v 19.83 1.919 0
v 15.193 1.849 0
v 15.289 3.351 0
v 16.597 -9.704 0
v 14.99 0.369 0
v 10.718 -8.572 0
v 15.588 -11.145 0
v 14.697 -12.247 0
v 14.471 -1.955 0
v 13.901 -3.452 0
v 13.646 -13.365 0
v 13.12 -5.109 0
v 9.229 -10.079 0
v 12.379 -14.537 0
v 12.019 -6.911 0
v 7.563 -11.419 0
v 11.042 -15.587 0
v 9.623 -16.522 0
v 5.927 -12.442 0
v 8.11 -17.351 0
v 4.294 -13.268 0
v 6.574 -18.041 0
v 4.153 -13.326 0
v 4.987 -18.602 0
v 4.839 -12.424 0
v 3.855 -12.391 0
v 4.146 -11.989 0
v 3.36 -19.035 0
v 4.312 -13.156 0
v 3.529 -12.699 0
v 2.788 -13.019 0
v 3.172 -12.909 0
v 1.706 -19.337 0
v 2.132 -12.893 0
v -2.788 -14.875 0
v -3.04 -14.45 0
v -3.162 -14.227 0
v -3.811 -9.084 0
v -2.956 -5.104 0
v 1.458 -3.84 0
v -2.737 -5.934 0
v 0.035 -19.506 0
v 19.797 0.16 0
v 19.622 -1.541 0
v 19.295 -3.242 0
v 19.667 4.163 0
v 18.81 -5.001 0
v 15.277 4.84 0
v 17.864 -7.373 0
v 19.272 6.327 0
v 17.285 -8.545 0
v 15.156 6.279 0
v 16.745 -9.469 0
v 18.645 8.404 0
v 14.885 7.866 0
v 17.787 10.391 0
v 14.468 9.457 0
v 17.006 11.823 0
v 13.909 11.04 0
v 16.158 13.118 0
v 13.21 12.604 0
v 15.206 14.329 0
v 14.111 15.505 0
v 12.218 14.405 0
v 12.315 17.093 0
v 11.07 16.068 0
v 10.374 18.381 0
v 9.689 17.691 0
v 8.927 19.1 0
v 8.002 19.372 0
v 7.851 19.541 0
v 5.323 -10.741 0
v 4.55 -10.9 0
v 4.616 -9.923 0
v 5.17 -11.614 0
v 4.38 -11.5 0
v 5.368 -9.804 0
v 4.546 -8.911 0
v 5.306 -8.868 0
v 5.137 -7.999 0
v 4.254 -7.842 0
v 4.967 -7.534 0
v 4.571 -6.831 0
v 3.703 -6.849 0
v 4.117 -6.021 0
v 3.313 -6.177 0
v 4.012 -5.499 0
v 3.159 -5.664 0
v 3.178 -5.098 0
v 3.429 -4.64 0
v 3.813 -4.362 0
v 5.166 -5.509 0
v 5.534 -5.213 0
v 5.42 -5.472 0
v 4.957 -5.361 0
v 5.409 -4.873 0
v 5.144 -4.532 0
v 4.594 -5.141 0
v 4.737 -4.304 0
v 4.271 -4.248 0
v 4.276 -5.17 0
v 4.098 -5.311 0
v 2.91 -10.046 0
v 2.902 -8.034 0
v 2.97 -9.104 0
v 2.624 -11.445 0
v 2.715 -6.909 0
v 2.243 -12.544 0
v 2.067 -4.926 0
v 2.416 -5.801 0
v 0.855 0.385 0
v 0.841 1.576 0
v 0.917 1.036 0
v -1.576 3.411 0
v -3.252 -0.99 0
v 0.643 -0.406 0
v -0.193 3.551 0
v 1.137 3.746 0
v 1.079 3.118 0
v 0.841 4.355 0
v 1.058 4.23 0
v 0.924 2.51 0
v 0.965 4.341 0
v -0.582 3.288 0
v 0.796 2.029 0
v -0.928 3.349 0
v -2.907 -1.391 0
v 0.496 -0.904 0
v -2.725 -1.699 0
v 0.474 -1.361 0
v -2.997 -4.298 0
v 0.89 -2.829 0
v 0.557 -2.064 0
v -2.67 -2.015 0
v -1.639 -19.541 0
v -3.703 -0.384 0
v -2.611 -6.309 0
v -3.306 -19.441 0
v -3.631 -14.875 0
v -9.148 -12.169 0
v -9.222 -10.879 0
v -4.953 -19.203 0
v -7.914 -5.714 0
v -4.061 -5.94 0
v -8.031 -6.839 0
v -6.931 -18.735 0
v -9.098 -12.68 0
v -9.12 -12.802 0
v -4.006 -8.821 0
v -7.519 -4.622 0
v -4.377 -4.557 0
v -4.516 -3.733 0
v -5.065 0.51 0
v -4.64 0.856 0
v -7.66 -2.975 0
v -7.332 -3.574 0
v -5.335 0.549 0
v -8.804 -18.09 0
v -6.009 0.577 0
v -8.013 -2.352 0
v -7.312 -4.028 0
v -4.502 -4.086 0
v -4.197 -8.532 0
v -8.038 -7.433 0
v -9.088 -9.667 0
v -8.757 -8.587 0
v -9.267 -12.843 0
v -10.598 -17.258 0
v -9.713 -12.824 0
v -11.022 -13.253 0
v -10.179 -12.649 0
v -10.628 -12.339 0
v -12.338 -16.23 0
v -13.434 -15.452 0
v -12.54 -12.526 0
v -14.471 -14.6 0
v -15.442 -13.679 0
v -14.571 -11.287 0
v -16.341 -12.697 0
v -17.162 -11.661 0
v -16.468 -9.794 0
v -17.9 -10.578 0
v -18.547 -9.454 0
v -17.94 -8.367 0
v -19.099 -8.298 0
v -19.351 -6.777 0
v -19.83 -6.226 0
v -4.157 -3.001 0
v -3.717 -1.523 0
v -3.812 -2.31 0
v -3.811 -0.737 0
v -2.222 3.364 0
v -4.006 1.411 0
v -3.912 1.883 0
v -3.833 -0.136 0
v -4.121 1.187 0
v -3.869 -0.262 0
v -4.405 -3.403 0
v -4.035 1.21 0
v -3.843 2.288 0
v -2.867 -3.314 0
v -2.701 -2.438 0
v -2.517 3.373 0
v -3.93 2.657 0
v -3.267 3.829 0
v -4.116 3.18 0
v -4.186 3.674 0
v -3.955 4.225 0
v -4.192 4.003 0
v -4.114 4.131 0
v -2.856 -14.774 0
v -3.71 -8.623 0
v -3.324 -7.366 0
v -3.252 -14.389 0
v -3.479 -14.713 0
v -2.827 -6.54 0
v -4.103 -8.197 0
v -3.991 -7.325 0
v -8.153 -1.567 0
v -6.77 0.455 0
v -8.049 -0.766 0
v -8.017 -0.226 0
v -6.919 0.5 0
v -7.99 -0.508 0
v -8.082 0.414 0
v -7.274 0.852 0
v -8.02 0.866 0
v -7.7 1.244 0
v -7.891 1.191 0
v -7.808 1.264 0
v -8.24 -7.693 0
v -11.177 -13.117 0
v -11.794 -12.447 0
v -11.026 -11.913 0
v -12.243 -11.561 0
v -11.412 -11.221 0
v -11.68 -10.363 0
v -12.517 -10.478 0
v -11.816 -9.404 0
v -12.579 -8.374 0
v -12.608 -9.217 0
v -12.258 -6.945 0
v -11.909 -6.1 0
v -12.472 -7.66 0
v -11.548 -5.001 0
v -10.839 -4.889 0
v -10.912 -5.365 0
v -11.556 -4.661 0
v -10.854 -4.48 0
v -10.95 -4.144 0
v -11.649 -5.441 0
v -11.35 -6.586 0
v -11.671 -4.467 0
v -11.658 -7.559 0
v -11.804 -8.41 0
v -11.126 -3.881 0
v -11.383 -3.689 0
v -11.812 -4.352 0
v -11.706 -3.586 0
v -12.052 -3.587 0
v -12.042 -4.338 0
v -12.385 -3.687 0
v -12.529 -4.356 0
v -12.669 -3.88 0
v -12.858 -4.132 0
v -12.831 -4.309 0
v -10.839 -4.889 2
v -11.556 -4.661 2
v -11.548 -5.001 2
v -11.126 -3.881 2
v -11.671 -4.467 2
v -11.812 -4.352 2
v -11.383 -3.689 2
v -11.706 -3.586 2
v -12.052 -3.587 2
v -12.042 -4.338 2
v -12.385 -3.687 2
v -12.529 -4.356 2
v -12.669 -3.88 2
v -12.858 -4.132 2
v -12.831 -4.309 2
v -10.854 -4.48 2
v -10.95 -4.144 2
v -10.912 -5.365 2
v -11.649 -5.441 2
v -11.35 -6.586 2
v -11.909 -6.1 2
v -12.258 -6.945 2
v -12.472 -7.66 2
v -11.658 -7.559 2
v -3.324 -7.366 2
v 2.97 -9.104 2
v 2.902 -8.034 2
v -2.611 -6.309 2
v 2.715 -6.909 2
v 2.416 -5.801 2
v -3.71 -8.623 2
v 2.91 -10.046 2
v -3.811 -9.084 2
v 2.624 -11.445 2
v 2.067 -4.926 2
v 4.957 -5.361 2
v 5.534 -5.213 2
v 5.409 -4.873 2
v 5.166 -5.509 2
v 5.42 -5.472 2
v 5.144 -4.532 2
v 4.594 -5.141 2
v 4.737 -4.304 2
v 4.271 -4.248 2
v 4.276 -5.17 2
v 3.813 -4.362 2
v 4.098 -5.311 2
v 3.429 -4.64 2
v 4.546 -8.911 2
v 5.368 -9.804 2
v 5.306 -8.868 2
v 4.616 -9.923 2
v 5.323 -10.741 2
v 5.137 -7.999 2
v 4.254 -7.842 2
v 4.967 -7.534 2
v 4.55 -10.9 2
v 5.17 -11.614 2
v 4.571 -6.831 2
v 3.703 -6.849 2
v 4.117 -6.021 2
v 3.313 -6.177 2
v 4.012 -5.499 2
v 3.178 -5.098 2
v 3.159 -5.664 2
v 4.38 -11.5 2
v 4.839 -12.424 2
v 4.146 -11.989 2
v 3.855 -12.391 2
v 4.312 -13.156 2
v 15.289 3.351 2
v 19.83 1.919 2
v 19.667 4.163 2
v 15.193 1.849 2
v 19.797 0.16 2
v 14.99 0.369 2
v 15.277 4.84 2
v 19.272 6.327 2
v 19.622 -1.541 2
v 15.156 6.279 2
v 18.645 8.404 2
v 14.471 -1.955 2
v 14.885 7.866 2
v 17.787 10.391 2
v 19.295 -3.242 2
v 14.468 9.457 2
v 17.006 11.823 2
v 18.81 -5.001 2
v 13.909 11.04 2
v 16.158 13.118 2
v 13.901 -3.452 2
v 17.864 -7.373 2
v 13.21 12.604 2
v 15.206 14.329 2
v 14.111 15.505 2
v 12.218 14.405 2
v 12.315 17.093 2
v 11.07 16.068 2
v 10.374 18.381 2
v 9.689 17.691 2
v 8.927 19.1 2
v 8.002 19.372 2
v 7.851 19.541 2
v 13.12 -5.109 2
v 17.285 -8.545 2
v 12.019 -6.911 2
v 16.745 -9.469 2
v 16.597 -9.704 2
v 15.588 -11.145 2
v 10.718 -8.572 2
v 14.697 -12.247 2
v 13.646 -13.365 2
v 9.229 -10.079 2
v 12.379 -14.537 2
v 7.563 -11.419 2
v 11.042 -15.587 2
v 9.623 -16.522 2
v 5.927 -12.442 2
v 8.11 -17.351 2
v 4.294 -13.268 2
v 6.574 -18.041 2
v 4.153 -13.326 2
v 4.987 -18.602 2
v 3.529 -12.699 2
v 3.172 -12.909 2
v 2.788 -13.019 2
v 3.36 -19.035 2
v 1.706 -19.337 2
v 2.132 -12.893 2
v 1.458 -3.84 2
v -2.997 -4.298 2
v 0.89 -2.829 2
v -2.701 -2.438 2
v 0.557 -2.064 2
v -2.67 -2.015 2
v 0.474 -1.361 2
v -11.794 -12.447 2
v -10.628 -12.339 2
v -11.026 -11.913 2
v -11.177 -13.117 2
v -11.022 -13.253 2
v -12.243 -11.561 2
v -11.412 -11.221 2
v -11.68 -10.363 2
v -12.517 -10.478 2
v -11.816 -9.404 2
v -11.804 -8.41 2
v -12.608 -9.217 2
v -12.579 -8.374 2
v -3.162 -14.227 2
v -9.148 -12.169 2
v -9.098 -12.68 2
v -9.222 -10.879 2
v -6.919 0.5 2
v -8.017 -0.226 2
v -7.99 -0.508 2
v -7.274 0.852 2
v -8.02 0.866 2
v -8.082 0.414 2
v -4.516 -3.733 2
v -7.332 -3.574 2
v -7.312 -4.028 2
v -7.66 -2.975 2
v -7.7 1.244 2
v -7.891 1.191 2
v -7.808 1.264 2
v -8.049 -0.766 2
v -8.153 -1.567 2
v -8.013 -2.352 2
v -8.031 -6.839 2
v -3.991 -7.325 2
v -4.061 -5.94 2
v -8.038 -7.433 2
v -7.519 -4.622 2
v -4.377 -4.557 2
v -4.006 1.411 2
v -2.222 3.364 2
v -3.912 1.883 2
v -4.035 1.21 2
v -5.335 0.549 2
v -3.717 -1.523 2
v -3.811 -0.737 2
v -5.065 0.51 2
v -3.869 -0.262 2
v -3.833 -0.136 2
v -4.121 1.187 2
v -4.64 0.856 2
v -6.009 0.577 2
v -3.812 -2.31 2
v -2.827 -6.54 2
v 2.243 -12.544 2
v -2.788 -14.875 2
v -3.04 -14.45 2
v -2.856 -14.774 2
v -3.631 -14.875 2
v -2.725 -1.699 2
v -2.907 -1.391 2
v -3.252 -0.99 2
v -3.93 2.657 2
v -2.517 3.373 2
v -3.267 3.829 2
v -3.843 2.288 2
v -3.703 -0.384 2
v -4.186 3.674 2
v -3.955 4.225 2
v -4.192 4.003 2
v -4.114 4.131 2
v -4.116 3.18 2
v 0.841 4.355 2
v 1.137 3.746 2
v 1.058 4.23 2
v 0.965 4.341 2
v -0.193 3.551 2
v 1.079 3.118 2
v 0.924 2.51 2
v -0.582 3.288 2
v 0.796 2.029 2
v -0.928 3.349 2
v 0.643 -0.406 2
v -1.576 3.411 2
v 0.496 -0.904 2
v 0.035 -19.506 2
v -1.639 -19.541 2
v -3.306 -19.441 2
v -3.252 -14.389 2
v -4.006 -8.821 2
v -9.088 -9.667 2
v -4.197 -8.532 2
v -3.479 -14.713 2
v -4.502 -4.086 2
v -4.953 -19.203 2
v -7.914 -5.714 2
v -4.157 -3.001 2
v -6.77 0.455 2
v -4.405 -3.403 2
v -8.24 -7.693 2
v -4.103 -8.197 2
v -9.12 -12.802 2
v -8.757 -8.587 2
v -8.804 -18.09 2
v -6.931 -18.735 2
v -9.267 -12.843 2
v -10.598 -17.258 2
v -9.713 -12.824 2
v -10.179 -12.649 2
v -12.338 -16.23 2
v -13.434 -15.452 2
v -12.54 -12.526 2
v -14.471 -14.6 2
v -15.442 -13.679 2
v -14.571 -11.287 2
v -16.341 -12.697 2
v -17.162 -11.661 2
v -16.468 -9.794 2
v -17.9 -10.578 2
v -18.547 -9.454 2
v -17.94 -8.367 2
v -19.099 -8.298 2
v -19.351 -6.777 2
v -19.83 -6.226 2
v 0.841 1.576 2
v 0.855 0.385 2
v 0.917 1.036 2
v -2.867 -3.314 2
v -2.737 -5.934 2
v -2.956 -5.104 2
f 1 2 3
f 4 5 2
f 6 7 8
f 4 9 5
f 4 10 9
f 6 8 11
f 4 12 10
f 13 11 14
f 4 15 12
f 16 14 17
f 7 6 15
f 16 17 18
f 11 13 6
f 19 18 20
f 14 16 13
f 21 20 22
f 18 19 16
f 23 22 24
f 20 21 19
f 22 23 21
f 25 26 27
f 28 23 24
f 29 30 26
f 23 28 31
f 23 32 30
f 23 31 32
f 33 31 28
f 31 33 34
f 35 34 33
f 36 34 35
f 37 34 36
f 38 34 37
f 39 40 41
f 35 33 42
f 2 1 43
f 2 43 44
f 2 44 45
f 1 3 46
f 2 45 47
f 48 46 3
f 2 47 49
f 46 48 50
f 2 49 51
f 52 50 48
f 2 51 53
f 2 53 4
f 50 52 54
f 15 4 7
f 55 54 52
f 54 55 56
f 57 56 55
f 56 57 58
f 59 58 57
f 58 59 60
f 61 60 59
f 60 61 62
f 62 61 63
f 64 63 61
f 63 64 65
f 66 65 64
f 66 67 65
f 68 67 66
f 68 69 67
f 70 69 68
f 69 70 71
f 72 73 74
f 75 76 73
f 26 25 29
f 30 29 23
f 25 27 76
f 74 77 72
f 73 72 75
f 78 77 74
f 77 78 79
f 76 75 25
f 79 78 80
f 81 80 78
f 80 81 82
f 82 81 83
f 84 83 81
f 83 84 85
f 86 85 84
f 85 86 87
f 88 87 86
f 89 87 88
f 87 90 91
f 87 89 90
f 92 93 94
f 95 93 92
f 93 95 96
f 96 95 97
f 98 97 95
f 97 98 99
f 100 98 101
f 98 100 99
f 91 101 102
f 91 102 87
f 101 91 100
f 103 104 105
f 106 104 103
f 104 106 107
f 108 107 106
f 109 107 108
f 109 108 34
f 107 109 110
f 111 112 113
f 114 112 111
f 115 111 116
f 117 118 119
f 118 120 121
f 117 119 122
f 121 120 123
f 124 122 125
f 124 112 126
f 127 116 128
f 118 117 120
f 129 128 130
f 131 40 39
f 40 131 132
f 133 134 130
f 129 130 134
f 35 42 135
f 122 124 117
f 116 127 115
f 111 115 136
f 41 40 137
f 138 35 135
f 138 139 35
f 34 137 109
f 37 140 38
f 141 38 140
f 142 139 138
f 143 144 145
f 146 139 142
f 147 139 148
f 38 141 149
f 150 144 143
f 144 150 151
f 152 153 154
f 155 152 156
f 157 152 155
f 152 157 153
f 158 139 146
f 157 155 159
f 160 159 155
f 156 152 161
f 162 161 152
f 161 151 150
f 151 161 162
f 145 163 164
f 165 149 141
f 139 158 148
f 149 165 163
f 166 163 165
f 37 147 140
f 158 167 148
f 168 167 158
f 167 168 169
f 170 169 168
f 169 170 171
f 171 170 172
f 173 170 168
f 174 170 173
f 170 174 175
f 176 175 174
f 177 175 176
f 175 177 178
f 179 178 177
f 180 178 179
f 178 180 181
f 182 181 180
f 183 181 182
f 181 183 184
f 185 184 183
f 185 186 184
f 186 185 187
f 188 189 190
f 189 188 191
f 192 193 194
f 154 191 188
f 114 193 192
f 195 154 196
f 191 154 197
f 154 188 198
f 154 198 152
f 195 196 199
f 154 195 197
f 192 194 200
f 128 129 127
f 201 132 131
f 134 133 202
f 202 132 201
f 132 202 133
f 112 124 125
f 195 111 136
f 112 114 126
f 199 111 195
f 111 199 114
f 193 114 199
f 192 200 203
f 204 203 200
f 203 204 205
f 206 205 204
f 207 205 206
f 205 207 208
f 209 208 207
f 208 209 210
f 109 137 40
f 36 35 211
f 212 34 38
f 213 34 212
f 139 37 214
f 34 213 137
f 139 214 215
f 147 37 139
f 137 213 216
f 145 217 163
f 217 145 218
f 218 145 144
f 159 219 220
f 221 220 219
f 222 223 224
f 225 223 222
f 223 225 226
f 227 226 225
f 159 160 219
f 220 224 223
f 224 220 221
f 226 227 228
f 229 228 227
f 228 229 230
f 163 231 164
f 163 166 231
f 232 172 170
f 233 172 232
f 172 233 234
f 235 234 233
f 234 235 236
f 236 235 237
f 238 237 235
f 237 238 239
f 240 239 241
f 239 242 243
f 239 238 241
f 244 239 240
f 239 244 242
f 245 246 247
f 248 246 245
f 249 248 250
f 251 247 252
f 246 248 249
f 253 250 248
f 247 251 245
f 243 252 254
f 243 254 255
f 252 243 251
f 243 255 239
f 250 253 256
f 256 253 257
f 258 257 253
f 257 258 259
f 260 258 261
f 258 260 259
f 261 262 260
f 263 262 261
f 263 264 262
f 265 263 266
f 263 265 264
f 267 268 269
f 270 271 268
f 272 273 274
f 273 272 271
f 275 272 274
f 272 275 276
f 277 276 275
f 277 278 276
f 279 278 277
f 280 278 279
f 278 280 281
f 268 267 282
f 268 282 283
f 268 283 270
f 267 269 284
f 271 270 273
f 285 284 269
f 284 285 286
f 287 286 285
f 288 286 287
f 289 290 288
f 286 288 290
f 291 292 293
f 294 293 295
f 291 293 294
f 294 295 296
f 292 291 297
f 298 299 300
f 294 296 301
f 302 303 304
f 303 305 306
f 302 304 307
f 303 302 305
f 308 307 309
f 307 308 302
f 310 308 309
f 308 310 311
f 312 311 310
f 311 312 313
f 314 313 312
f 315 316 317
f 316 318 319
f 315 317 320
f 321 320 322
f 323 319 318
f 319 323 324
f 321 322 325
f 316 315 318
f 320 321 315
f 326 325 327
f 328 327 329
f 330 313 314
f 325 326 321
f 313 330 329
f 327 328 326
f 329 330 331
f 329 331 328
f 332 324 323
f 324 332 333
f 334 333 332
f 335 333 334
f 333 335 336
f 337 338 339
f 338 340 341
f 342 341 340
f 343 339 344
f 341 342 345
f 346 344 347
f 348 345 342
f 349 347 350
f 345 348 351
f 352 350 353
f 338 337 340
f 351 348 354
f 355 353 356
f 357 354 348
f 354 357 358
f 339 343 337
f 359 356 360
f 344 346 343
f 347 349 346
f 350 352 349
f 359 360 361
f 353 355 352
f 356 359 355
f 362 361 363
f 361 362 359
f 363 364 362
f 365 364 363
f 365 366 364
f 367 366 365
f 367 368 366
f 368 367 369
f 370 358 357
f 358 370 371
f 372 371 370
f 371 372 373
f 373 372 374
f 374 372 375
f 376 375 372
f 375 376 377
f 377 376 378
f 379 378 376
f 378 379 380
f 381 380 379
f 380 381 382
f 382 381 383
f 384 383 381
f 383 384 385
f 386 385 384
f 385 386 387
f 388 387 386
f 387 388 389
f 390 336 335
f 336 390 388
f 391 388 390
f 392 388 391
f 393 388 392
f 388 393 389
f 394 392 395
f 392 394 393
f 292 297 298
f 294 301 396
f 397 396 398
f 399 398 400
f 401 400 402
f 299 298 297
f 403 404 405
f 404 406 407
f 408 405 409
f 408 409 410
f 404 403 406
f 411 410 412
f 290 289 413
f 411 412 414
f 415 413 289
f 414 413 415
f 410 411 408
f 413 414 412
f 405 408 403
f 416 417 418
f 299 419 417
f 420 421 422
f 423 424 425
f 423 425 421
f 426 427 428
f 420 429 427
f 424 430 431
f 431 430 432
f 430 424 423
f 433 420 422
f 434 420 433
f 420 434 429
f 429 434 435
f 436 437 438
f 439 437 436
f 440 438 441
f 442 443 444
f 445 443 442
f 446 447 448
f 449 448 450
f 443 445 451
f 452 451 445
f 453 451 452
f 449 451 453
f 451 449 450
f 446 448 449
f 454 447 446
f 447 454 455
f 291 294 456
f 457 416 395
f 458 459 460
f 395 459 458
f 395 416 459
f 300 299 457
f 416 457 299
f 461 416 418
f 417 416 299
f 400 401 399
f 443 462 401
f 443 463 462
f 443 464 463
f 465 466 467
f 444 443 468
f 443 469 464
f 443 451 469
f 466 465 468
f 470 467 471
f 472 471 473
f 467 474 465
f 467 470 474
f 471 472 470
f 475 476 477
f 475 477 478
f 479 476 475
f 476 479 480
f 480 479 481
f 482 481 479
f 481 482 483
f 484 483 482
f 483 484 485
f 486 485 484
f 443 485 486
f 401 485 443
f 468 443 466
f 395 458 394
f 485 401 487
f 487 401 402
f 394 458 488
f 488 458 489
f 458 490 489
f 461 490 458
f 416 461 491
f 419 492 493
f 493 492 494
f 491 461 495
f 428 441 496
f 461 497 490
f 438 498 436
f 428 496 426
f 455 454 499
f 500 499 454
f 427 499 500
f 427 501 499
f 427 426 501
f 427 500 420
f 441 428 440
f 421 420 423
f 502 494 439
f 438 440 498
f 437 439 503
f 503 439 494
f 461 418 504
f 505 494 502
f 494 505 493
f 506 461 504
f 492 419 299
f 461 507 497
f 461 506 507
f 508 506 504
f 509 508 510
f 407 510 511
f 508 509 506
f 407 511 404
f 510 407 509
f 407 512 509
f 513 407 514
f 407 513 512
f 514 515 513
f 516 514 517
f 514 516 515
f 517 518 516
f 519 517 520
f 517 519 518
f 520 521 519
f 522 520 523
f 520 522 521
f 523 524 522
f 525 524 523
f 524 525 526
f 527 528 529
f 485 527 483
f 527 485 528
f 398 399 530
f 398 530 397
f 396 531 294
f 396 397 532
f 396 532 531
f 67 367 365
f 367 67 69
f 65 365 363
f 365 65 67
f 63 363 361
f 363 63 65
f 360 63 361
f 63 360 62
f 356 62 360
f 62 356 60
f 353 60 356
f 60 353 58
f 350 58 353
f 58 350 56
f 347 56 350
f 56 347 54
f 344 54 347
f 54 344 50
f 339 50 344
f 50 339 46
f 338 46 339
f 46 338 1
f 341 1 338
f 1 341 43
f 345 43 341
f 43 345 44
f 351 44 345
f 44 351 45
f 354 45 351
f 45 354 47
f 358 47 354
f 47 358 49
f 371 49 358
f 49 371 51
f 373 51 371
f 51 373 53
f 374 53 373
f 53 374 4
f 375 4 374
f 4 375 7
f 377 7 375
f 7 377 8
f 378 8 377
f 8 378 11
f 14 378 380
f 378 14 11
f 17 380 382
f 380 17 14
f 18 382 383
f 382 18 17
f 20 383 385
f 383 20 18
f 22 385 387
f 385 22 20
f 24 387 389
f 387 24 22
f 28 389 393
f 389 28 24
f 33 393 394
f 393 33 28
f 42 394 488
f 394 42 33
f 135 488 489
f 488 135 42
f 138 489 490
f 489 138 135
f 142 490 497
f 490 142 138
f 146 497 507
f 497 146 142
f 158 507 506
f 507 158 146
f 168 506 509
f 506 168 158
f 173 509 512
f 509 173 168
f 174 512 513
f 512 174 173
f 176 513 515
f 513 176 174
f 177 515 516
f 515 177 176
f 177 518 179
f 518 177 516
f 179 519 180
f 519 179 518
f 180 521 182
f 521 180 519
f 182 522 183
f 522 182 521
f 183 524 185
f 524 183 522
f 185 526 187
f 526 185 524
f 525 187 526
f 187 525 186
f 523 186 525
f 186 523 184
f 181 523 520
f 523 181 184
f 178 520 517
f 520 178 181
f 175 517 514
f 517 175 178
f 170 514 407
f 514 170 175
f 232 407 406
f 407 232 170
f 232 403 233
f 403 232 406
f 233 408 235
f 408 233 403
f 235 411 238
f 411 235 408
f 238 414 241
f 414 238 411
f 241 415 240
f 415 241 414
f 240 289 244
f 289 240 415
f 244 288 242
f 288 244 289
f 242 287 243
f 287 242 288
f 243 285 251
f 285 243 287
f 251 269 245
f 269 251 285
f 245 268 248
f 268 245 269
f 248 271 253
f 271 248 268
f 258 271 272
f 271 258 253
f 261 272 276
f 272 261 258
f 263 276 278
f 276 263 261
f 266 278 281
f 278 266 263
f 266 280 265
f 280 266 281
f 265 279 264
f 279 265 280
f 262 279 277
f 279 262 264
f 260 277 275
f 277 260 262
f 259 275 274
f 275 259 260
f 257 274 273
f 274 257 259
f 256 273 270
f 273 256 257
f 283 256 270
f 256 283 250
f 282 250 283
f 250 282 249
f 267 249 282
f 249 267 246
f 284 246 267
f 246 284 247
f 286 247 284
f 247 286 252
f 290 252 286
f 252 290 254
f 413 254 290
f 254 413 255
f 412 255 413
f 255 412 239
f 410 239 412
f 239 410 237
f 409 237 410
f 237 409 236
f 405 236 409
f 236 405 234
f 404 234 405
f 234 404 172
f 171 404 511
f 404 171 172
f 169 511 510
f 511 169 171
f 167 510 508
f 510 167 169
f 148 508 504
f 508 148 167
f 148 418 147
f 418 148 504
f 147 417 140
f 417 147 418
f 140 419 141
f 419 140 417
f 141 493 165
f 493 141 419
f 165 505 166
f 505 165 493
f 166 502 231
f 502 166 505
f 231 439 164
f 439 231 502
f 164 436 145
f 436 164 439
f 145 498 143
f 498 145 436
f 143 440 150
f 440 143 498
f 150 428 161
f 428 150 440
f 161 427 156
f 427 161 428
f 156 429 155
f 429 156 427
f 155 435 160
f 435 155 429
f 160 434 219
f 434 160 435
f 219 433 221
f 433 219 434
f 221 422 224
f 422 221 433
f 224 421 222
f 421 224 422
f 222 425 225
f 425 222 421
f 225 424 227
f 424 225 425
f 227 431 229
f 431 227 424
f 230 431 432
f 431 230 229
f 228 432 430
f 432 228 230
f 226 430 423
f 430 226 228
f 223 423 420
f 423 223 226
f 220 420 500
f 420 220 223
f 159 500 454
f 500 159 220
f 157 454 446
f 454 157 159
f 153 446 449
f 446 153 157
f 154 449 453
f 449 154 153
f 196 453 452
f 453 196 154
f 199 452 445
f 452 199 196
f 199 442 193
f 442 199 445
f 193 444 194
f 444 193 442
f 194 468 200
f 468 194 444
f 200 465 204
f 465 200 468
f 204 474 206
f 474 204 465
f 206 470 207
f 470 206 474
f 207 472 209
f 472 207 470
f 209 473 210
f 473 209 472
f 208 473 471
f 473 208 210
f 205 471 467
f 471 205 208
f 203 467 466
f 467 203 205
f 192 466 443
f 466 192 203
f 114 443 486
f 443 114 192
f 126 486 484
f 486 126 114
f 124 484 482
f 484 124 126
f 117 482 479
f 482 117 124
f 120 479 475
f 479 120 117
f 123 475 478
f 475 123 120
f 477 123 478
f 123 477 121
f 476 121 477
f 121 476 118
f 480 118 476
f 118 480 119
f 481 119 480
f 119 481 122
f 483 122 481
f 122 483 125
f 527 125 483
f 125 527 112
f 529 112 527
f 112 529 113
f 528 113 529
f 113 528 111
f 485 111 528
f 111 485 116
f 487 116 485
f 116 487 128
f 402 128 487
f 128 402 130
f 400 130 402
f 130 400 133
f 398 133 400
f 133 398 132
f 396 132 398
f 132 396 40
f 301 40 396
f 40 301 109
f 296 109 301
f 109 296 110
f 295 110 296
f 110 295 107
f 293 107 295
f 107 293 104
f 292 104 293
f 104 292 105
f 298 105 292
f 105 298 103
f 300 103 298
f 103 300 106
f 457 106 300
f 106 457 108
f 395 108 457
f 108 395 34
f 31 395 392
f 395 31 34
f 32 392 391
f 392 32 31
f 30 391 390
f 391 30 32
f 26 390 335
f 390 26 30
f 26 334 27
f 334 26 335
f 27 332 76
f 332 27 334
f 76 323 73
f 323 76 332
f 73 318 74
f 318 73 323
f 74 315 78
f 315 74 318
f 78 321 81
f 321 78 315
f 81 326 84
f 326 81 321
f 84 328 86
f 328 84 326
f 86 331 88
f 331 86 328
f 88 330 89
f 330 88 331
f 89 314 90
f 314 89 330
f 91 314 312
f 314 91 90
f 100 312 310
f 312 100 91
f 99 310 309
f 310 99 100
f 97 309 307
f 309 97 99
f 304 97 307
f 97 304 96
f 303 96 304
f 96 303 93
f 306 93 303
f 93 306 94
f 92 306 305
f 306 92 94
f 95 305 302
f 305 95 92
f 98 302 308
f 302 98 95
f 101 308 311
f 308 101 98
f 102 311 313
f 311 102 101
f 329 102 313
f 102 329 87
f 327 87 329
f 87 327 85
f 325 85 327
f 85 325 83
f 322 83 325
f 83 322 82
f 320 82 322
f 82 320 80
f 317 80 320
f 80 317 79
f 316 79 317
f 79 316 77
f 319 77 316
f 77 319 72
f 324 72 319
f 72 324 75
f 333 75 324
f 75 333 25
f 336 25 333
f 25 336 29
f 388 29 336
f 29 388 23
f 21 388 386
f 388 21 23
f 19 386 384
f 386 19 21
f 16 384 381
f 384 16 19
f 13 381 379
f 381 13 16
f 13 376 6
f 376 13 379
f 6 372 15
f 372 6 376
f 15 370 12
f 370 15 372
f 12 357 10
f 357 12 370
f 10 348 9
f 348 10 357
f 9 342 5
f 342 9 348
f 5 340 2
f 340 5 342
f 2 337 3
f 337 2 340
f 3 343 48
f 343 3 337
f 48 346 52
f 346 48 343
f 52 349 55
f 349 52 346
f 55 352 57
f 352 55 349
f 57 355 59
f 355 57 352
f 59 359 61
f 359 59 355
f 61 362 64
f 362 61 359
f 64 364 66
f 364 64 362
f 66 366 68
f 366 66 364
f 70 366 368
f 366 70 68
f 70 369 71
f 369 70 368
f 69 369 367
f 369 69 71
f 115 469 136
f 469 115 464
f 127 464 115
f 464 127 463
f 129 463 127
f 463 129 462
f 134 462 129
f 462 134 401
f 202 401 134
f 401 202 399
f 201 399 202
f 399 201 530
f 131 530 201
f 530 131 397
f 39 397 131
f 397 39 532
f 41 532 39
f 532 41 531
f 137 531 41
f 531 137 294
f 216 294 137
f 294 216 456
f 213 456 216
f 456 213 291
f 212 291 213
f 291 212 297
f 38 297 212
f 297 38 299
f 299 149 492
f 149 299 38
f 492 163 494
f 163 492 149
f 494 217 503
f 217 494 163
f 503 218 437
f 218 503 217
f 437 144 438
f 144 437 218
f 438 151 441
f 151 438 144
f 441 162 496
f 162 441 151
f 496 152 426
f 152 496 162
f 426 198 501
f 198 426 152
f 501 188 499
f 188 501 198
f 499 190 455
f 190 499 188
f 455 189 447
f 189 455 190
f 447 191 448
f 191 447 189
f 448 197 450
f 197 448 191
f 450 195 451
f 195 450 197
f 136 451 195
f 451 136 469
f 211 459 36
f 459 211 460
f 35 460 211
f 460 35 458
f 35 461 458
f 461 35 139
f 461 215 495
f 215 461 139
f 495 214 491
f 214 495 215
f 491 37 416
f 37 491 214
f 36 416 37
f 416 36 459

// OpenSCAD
// Module names are of the form poly_<inkscape-path-id>().  As a result,
// you can associate a polygon in this OpenSCAD program with the corresponding
// SVG element in the Inkscape document by looking for the XML element with
// the attribute id="inkscape-path-id".

// fudge value is used to ensure that subtracted solids are a tad taller
// in the z dimension than the polygon being subtracted from.  This helps
// keep the resulting .stl file manifold.
fudge = 0.1;

module poly_path8(h)
{
  scale([25.4/90, -25.4/90, 1]) union()
  {
    difference()
    {
       linear_extrude(height=h)
         polygon([[28.354653,-68.640997],[34.331771,-62.683431],[39.223085,-56.932971],[43.293160,-51.041248],[46.806566,-44.659895],[49.282849,-39.116539],[51.264714,-33.507341],[52.741386,-27.871806],[53.702090,-22.249440],[54.131065,-17.149226],[54.174561,-11.874229],[53.834973,-6.551347],[53.114694,-1.307476],[51.275887,6.928845],[49.255115,12.232972],[46.487328,18.102149],[42.586449,24.486894],[37.978059,30.373629],[32.701666,35.714468],[26.796775,40.461526],[21.001022,44.086465],[15.214847,47.012274],[14.716837,47.216586],[15.278695,46.616420],[17.147829,44.022617],[18.317833,41.151078],[18.861933,38.058068],[19.021752,34.737602],[18.800879,31.421924],[18.202908,28.343280],[17.597953,26.696016],[16.198098,24.205965],[14.589142,21.332830],[14.214039,19.486042],[14.519110,18.817041],[15.151000,18.319230],[16.276311,18.217074],[17.564433,18.996013],[18.305064,19.519562],[19.205313,19.388675],[19.607552,18.472464],[19.167004,17.265747],[18.228447,16.059030],[16.783100,15.249764],[15.131846,15.053433],[13.509322,15.455672],[12.150170,16.442115],[11.259498,18.063840],[11.192458,20.068650],[11.739950,21.886706],[13.120651,24.269812],[15.074383,27.787807],[16.108712,31.573961],[16.354524,35.160591],[16.121481,38.622719],[15.521315,40.747243],[14.691298,42.479105],[13.658965,43.904499],[12.504523,44.994695],[11.239945,45.740114],[9.877201,46.131179],[7.553153,45.684247],[7.949008,44.445607],[9.297785,40.552508],[10.311363,35.596350],[10.524654,32.258326],[10.284228,28.467782],[9.620015,24.480908],[8.561943,20.553891],[7.323303,17.454097],[5.165259,13.607288],[3.152468,10.023850],[1.972886,7.311930],[1.679188,4.821879],[1.758997,3.201750],[2.279354,1.437964],[3.027965,-1.364939],[3.249835,-3.669832],[2.981676,-5.585255],[2.822057,-7.191019],[3.275374,-8.892553],[3.824462,-11.049001],[4.028774,-13.272488],[3.749442,-14.988388],[3.420029,-15.382447],[2.981676,-15.430532],[-0.683168,-12.582936],[-2.062273,-11.650763],[-3.288144,-11.867844],[-5.585056,-12.084926],[-7.872391,-11.918922],[-8.919489,-11.952442],[-11.575543,-13.566186],[-14.014515,-14.970830],[-14.576373,-14.638824],[-14.852513,-14.182314],[-14.831763,-13.017098],[-14.584354,-11.269274],[-13.925129,-9.416102],[-13.615469,-8.105633],[-13.861281,-6.670662],[-14.193288,-4.997859],[-14.297040,-4.285960],[-14.601912,-4.206150],[-16.440718,-3.031357],[-17.947518,-1.805486],[-18.905230,-1.945951],[-21.293125,-2.043318],[-23.987487,-1.613944],[-24.517421,-1.770370],[-25.775216,-3.018588],[-27.283612,-4.408866],[-27.666098,-4.478500],[-27.958798,-4.218920],[-28.418500,-3.069666],[-28.637178,-1.465499],[-28.405731,0.799490],[-28.309959,1.800299],[-28.520656,2.714913],[-28.887779,5.552932],[-28.392961,8.333489],[-27.141551,10.542611],[-25.979527,12.662346],[-25.909295,14.271302],[-26.643541,16.378268],[-28.043396,20.247423],[-28.456808,24.231504],[-28.482347,26.338470],[-29.197439,27.257873],[-31.027267,30.427300],[-32.199865,34.253957],[-32.675728,38.547499],[-32.415350,43.117580],[-32.236578,44.930847],[-32.316387,45.361818],[-32.836744,45.505474],[-34.417367,45.437836],[-36.067425,44.820710],[-37.660019,43.722335],[-39.068255,42.210946],[-40.436585,39.759802],[-41.385917,36.718469],[-41.865970,33.320388],[-41.826464,29.799002],[-41.309300,26.783806],[-40.217509,23.337640],[-38.664420,19.008783],[-38.404241,17.323210],[-38.459509,15.874072],[-38.798499,14.684714],[-39.422408,13.751544],[-40.332434,13.070970],[-41.477498,12.706241],[-42.702771,12.710232],[-43.882552,13.063787],[-44.891142,13.747753],[-45.561540,14.641617],[-45.465769,15.267322],[-44.393132,15.433325],[-42.669251,15.369478],[-41.853600,15.422152],[-41.353993,15.829180],[-40.945370,16.515540],[-40.919831,17.719064],[-41.275780,19.278538],[-42.196780,21.613758],[-43.435021,24.609202],[-44.192013,27.141351],[-44.570708,29.671107],[-44.674061,32.659367],[-44.350634,37.127492],[-43.379554,40.965921],[-41.788356,44.105220],[-39.604573,46.475956],[-39.055485,46.961196],[-44.431440,44.381759],[-51.630240,39.992247],[-58.350185,34.702486],[-63.568117,29.645768],[-68.565777,24.014423],[-70.264119,22.060691],[-67.671912,29.403147],[-65.718155,33.499809],[-63.424261,37.479451],[-60.811628,41.317231],[-57.901656,44.988310],[-54.715743,48.467846],[-51.275289,51.731000],[-47.601691,54.752929],[-43.716349,57.508795],[-37.550481,61.151691],[-31.194268,64.097852],[-24.557924,66.383191],[-17.551664,68.043624],[-11.714161,68.885562],[-5.808123,69.241163],[0.124852,69.116112],[6.043161,68.516095],[11.905205,67.446800],[17.669383,65.913913],[23.294094,63.923119],[28.737737,61.480106],[34.095536,58.542525],[39.124121,55.227845],[43.862999,51.508531],[48.351674,47.357050],[52.075576,43.395316],[55.234429,39.491044],[58.809886,34.383248],[59.333435,33.553232],[61.245267,30.278256],[63.298362,26.124581],[66.650353,17.719064],[68.369645,11.489149],[69.525084,5.460354],[70.146600,-0.568442],[70.264119,-6.798357],[69.687696,-14.751953],[68.286444,-22.417039],[66.063954,-29.778052],[63.023818,-36.819428],[60.257827,-41.891709],[57.253605,-46.482739],[53.878269,-50.772091],[49.998938,-54.939334],[43.636540,-60.565891],[36.756977,-65.129387],[31.631623,-67.678497],[27.818334,-69.241163],[28.354653,-68.640997]]);
       translate([0, 0, -fudge])
         linear_extrude(height=h+2*fudge)
           polygon([[-11.524465,3.506622],[-10.299791,4.928225],[-9.656927,6.020615],[-9.459399,7.139342],[-9.570733,8.639957],[-10.158129,11.742943],[-10.617831,15.229013],[-10.474174,18.084591],[-9.698428,21.026362],[-9.251496,22.354389],[-10.017665,23.171636],[-11.778258,26.100638],[-13.146190,30.552401],[-13.503736,32.186896],[-14.193288,31.254723],[-14.870071,30.233164],[-14.538064,29.045602],[-14.142210,25.955385],[-14.389619,21.047112],[-15.508546,16.148417],[-15.950689,14.478407],[-16.000171,13.227396],[-15.609105,12.057790],[-14.729607,10.631997],[-13.505332,8.186640],[-13.171729,5.396506],[-13.503736,2.612757],[-13.708048,0.927185],[-13.580353,0.480253],[-13.120651,1.361347],[-11.524465,3.506622]]);
       translate([0, 0, -fudge])
         linear_extrude(height=h+2*fudge)
           polygon([[-10.771065,51.200667],[-10.119821,52.349921],[-9.877201,52.707467],[-11.371231,52.707467],[-12.865261,52.707467],[-12.328943,52.132840],[-11.524465,50.983585],[-11.205227,50.408958],[-10.771065,51.200667]]);
    }
  }
}

module gatos(h)
{

poly_path8(h);
}

gatos(2);
